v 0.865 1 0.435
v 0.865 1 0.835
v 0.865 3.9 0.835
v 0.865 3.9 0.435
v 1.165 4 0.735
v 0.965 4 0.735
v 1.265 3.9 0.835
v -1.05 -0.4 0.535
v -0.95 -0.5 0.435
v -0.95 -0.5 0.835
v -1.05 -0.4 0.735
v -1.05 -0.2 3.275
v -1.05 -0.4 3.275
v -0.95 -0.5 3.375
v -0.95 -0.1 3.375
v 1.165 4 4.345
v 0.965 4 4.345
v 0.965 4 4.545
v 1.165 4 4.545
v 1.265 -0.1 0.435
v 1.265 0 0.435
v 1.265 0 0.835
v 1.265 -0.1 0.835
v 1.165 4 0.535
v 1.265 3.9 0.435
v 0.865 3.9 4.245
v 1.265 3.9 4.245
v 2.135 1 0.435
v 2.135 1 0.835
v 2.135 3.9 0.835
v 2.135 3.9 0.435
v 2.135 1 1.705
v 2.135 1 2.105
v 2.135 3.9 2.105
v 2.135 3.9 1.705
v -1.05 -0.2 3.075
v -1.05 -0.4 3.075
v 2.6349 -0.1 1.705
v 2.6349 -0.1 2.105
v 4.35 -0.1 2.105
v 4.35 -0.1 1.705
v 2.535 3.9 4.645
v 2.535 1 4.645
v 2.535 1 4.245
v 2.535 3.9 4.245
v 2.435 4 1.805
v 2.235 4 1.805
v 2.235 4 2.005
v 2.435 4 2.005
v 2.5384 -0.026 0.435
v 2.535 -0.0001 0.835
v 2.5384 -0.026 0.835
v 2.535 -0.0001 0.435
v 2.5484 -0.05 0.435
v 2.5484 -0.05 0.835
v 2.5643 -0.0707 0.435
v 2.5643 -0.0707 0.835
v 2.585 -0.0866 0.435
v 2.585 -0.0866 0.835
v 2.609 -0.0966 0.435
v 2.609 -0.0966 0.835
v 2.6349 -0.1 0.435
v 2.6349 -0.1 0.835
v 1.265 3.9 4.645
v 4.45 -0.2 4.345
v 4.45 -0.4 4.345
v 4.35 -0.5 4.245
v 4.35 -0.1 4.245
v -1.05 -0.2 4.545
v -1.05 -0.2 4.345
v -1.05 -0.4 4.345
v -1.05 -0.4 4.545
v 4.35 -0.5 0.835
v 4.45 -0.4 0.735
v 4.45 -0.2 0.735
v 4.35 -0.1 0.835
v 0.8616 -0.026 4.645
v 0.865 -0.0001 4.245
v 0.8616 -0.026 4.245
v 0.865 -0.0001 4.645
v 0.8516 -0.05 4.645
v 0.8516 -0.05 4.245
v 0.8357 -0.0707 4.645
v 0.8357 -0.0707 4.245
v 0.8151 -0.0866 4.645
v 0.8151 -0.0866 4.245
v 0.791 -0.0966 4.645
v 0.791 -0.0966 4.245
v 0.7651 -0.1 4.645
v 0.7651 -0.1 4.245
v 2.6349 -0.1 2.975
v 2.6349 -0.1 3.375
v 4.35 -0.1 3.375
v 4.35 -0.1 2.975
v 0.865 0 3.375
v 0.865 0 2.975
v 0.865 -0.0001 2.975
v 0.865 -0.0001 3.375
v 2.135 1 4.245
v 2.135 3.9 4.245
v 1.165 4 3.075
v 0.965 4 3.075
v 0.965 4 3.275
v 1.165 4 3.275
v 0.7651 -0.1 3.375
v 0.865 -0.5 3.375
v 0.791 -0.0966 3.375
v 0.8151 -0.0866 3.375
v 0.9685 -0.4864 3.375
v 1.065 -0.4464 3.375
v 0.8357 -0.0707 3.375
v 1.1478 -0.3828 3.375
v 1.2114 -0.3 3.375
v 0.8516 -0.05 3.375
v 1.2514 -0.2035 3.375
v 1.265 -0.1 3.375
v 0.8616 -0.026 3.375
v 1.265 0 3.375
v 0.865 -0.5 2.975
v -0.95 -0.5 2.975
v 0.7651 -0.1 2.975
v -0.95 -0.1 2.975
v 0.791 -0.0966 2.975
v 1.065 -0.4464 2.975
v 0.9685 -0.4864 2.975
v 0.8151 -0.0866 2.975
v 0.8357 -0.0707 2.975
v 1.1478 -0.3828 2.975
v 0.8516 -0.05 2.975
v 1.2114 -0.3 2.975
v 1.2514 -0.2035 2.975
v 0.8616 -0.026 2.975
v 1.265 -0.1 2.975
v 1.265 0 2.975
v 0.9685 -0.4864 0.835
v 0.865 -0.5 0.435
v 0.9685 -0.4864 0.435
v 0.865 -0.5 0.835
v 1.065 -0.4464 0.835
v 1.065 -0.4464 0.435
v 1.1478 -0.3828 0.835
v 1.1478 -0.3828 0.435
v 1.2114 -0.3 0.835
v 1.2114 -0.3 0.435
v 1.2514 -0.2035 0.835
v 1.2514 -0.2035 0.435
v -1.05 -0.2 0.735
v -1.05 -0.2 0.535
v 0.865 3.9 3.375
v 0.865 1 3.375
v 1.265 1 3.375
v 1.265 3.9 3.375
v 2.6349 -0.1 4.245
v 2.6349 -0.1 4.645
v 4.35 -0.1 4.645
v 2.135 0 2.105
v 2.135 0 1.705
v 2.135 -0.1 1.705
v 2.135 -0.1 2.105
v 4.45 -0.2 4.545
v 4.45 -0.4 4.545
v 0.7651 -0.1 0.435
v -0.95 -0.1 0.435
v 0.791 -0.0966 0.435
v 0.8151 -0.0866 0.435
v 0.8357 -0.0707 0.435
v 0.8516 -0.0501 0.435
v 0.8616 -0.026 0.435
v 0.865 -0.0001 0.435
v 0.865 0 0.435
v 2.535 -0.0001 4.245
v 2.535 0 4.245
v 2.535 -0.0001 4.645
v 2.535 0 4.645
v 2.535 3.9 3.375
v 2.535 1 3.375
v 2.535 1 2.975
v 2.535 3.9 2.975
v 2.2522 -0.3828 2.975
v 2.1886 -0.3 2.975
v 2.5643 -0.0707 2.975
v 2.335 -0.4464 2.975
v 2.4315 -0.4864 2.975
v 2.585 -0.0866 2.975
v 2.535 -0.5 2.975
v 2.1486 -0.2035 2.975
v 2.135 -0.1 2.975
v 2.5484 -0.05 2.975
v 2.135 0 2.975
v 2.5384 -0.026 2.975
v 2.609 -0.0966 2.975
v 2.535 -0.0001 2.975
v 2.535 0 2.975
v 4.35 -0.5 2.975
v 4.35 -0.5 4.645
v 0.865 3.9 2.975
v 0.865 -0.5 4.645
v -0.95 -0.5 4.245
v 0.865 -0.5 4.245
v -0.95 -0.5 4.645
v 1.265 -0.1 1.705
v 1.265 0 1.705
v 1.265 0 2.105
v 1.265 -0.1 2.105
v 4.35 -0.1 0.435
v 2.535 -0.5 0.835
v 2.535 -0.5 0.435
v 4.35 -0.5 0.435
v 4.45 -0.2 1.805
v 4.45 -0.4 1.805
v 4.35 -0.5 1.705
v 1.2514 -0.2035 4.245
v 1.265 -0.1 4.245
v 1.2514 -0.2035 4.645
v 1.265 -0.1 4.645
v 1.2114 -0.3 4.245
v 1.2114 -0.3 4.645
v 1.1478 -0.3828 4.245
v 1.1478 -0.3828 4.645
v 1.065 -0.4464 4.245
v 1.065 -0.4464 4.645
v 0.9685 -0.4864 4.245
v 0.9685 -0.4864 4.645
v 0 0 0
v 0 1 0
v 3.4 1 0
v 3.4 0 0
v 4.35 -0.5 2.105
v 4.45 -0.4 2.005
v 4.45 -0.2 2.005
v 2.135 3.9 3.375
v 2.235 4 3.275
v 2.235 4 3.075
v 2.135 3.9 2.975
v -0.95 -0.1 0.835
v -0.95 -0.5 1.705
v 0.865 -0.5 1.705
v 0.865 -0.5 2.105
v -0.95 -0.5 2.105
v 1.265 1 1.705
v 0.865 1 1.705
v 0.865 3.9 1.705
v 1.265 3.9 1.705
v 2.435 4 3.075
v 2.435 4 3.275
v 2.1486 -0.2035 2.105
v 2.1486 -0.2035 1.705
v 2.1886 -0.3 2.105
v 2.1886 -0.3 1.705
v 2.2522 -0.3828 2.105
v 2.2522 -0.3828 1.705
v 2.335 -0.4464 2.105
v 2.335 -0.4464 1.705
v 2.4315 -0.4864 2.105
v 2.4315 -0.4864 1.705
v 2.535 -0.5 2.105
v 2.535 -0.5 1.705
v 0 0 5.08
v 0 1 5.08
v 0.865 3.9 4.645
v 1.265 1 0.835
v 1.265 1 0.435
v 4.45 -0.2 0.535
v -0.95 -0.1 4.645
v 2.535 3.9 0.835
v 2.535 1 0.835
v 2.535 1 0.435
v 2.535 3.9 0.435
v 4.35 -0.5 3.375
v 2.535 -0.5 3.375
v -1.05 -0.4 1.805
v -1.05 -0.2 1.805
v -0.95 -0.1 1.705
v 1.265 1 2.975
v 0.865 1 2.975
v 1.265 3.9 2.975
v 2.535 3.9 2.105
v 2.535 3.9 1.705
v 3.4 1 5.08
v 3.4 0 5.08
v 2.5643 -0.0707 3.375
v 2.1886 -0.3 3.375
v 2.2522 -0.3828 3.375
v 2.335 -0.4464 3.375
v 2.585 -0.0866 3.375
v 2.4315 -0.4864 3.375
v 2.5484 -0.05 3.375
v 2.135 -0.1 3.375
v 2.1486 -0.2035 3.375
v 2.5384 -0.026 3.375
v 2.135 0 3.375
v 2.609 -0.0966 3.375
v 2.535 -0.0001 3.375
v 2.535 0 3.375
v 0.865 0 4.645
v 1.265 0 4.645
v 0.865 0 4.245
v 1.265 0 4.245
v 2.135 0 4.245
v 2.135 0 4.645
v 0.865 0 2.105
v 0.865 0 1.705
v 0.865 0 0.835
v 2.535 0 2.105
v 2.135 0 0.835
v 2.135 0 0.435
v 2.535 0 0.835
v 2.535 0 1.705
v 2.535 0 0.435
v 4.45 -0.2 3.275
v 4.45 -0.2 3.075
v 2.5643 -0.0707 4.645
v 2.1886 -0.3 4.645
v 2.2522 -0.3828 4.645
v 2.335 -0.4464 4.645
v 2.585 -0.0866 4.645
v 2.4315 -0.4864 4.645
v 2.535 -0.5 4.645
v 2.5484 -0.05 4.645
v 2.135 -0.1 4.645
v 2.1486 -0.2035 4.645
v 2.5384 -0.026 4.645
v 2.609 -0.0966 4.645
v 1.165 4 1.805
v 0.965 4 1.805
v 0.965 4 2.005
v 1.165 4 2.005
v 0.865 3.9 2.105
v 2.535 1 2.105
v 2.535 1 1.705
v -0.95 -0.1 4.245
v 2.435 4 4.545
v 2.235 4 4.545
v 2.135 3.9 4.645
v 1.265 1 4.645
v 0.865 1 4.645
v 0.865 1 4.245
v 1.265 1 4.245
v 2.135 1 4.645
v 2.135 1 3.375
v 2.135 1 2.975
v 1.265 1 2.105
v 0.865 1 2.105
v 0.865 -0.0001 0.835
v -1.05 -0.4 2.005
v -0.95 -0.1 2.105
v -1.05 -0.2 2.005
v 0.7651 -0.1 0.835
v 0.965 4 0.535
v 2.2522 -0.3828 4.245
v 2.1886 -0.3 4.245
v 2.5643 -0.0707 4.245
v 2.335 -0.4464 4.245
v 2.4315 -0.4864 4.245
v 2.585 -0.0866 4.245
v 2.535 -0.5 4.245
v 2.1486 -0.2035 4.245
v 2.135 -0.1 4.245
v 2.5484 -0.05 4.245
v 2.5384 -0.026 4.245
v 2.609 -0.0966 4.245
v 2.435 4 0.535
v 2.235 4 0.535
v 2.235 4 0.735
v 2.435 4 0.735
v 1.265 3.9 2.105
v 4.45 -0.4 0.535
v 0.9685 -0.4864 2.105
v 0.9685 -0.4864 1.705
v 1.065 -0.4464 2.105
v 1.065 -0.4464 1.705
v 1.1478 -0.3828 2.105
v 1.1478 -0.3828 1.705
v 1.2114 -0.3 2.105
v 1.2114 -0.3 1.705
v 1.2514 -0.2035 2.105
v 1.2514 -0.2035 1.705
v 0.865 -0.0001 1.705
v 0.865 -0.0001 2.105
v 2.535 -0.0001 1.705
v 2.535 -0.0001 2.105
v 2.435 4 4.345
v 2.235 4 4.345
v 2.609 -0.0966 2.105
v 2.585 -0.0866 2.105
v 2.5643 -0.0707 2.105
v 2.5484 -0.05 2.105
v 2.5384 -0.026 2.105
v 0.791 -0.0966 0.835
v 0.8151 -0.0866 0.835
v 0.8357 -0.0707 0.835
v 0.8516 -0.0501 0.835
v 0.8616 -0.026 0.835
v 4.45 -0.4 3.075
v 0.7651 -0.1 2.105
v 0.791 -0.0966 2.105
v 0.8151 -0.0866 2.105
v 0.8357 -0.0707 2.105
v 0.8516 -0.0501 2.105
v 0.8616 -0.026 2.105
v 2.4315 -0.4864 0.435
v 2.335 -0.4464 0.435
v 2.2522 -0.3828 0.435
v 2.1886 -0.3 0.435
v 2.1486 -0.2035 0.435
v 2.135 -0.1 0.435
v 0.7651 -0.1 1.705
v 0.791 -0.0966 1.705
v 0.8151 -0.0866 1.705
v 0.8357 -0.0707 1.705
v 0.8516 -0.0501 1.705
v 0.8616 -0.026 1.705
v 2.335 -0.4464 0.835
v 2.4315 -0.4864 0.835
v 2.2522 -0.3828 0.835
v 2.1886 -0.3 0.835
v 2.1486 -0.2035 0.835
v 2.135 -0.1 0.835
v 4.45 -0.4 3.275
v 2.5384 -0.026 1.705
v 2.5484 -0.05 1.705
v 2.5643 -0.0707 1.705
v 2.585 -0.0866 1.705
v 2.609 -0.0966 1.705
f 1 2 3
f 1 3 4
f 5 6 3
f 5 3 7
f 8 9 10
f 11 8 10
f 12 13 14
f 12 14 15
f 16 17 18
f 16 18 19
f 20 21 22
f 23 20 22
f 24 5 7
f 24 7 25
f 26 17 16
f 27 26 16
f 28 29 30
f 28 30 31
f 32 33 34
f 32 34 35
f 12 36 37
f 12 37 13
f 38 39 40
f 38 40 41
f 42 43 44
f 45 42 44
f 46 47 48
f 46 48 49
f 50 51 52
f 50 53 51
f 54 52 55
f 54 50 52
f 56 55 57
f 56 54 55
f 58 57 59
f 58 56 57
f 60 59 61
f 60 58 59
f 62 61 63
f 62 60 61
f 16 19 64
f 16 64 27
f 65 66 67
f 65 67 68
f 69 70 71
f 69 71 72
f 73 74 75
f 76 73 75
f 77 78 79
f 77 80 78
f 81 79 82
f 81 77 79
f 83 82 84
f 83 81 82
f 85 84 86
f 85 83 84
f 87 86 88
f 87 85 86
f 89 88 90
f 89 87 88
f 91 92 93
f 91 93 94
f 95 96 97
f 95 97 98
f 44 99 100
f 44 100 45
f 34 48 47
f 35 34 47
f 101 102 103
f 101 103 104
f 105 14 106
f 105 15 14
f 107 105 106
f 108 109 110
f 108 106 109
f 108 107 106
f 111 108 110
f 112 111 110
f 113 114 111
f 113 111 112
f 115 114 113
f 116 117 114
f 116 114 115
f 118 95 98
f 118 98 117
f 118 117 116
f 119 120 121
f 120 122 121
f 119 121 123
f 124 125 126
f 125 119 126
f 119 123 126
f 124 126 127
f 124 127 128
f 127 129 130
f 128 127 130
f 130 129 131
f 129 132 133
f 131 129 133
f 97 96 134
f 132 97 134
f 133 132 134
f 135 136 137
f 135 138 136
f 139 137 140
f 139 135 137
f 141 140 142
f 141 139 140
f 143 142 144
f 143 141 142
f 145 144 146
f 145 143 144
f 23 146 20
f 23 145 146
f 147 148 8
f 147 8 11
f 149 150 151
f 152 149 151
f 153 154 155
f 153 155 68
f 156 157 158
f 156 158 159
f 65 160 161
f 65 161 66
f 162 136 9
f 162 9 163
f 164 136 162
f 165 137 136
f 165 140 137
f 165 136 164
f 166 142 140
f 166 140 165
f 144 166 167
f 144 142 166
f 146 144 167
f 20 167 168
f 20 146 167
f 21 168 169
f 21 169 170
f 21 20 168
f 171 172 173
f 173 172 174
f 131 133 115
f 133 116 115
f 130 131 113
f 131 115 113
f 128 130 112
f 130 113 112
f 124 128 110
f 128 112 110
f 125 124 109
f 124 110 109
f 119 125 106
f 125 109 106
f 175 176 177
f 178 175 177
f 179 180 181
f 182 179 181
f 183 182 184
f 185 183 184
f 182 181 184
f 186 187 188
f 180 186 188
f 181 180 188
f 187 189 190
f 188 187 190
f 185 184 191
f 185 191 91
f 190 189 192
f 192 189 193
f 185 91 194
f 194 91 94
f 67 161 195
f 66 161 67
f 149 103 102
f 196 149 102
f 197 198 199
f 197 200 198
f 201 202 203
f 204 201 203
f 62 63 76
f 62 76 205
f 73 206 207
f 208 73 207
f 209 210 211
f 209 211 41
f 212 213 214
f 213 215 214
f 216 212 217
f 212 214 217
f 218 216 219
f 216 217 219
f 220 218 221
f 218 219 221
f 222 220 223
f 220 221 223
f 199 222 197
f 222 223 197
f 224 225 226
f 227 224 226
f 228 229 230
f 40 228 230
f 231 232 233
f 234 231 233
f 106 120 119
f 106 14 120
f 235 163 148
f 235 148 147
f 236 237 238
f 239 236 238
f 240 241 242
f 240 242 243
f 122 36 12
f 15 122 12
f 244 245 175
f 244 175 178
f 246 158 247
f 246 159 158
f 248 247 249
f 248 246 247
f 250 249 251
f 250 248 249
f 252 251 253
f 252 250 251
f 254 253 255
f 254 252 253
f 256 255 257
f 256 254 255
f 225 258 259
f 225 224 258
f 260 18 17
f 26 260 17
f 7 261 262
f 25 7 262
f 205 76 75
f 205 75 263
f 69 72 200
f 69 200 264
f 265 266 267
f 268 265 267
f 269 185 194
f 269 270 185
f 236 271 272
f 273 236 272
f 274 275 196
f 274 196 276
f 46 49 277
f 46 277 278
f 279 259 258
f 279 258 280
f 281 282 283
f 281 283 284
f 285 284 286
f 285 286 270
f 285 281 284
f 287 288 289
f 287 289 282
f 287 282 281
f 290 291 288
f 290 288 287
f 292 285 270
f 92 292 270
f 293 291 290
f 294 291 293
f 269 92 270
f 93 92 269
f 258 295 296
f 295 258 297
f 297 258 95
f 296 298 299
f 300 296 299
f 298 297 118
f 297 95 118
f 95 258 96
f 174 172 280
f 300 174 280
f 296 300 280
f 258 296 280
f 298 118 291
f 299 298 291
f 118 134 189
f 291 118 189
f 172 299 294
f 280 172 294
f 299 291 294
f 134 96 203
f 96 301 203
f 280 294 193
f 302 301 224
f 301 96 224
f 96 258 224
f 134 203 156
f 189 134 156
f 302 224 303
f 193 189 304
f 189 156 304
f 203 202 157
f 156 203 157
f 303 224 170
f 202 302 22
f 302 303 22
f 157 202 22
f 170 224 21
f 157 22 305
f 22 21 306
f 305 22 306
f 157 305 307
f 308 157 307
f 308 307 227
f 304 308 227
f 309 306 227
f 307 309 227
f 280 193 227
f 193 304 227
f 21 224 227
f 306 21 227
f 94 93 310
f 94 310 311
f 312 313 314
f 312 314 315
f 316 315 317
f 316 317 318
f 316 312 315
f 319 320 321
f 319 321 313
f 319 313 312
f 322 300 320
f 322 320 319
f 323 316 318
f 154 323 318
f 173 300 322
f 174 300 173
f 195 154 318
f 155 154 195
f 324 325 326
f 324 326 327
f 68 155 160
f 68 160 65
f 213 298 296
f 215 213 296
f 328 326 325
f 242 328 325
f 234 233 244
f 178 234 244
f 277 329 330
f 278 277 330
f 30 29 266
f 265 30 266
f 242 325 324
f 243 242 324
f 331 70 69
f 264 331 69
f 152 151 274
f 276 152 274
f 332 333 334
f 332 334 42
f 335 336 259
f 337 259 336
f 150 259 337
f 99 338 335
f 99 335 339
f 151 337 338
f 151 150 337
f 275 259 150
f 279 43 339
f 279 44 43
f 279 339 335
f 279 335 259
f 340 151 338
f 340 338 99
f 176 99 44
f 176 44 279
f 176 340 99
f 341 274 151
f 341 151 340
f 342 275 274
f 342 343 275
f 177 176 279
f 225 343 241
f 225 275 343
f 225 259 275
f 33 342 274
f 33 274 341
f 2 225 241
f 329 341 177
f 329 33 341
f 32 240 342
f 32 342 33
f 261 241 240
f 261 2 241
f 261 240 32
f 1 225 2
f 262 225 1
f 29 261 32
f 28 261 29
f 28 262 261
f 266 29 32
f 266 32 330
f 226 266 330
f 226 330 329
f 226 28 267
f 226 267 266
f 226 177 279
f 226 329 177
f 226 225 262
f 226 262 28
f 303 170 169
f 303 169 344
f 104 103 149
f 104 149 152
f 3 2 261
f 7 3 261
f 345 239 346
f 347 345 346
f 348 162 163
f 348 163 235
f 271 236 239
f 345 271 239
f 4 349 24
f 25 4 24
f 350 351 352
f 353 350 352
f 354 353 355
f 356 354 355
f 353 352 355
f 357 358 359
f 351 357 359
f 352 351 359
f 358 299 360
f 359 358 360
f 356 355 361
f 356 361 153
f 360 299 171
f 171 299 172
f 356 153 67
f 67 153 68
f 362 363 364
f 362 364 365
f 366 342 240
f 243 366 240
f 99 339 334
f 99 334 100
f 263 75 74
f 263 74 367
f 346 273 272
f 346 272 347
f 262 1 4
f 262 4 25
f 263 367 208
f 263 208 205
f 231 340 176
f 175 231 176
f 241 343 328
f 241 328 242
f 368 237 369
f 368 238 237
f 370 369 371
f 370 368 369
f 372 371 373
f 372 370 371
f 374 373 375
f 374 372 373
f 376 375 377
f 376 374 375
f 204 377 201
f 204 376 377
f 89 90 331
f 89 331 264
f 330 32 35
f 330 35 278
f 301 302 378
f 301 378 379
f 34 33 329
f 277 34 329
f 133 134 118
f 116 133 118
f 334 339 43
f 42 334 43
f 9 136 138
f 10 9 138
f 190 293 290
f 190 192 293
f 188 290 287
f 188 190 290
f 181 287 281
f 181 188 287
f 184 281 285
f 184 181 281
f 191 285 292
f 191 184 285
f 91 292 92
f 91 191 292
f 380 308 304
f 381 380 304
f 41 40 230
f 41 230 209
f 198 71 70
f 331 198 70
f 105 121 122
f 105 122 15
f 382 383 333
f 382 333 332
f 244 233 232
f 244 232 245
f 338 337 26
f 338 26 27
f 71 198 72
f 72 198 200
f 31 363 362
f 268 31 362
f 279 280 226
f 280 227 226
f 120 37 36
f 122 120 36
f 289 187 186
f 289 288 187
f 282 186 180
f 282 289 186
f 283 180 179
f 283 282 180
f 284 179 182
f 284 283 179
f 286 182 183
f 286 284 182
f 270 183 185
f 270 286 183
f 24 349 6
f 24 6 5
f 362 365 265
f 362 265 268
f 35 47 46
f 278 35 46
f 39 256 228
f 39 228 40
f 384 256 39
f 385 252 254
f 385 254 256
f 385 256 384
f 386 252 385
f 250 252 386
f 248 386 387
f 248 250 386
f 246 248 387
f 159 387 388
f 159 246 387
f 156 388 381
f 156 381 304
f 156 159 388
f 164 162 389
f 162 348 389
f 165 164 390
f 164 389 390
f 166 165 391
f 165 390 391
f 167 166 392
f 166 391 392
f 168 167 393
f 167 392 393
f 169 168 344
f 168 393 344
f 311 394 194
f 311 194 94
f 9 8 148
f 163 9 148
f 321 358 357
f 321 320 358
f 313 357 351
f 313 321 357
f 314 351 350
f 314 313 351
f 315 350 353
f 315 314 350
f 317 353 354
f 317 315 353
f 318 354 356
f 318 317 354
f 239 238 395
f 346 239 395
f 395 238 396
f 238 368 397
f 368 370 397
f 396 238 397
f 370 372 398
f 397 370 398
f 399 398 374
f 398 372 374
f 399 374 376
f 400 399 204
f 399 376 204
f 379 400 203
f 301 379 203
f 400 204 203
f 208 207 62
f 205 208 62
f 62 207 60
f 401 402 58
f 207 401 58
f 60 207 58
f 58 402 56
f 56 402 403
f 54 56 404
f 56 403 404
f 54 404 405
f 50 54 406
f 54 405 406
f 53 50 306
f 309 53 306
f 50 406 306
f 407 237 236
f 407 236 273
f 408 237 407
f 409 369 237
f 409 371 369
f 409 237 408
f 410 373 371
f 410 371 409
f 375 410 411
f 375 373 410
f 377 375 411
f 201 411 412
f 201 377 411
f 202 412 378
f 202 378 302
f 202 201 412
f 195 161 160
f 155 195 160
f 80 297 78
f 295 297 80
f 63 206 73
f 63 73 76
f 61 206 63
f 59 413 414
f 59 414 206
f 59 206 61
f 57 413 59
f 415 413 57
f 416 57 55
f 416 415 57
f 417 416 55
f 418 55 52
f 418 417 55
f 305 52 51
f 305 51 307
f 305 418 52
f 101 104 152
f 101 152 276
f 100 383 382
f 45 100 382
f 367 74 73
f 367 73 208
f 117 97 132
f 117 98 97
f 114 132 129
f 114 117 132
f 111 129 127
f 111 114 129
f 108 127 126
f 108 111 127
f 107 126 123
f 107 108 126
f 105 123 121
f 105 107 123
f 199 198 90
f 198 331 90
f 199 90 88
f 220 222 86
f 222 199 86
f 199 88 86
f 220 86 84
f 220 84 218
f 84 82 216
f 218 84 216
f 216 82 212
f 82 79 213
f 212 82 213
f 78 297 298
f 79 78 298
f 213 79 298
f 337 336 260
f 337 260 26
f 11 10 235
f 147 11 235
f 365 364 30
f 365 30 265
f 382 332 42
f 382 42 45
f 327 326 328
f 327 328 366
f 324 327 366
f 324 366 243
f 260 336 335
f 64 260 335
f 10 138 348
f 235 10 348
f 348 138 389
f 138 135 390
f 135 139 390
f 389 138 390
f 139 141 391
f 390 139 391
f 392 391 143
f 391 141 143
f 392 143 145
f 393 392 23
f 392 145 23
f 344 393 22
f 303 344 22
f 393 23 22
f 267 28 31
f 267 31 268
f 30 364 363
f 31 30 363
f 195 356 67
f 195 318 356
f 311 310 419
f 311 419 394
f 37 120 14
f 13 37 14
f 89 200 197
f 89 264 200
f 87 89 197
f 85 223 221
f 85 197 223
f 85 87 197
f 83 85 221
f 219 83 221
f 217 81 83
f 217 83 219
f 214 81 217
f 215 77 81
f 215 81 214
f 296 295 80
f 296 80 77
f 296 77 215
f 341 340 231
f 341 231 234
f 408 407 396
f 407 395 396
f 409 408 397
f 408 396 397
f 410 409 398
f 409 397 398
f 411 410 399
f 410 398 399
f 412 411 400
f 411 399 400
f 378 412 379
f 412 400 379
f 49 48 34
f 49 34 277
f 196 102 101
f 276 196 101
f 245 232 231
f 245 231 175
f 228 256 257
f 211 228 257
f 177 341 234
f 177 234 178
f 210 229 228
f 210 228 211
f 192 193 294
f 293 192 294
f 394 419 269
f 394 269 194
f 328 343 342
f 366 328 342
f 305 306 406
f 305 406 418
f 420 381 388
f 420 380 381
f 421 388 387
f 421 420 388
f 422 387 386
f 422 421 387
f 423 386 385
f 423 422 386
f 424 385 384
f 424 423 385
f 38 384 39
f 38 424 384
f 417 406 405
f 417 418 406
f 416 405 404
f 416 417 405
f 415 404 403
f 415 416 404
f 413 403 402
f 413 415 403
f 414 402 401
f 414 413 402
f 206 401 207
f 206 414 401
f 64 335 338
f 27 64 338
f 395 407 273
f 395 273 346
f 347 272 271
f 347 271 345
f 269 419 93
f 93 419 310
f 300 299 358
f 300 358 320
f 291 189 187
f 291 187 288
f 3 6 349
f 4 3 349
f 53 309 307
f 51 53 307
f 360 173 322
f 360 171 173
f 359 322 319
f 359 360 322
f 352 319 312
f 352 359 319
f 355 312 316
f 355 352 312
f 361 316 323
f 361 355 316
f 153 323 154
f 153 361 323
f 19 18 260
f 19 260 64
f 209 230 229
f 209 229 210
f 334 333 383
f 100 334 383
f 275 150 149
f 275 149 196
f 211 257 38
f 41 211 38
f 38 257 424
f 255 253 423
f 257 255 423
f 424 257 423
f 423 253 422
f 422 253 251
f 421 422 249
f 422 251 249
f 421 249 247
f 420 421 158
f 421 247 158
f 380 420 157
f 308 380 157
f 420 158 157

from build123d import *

# Parameters (mm, degrees)
SKIZZE1_W                         = 3.4
SKIZZE1_H                         = 1
AUFSATZ_LINEAR_AUSTRAGEN1_DEPTH   = 1.27
SKIZZE3_W                         = 0.4
SKIZZE3_H                         = 0.4
AUFSATZ_LINEAR_AUSTRAGEN3_DEPTH   = 0.5
SKIZZE4_W                         = 0.4
SKIZZE4_H                         = 0.4
AUFSATZ_LINEAR_AUSTRAGEN4_DEPTH   = 1.915
SKIZZE5_W                         = 0.4
SKIZZE5_H                         = 0.4
AUFSATZ_LINEAR_AUSTRAGEN5_DEPTH   = 1.915
SKIZZE6_W                         = 0.4
SKIZZE6_H                         = 0.4
AUFSATZ_LINEAR_AUSTRAGEN6_DEPTH   = 3
FASE2_SIZE                        = 0.1
VERRUNDUNG1_R                     = 0.1
VERRUNDUNG2_R                     = 0.4
LINEARES_MUSTER1_COUNT            = 4
LINEARES_MUSTER1_PITCH            = 1.27
FASE2_OF_LINEARES_MUSTER1_SIZE    = 0.1
VERRUNDUNG1_OF_LINEARES_MUSTER1_R = 0.1
VERRUNDUNG2_OF_LINEARES_MUSTER1_R = 0.4


with BuildPart() as part:
    # Skizze1 → Aufsatz-Linear austragen1 (new body)
    with BuildSketch(Plane.XY):
        with Locations((1.7, 0.5)):
            Rectangle(SKIZZE1_W, SKIZZE1_H)
    aufsatz_linear_austragen1 = extrude(amount=AUFSATZ_LINEAR_AUSTRAGEN1_DEPTH)

    # Skizze3 → Aufsatz-Linear austragen3 (add)
    with BuildSketch(Plane.XZ):
        with Locations((1.065, 0.635)):
            Rectangle(SKIZZE3_W, SKIZZE3_H)
        with Locations((2.335, 0.635)):
            Rectangle(SKIZZE3_W, SKIZZE3_H)
    aufsatz_linear_austragen3 = extrude(amount=AUFSATZ_LINEAR_AUSTRAGEN3_DEPTH)

    # Skizze4 → Aufsatz-Linear austragen4 (add)
    with BuildSketch(Plane(origin=(2.535, 0, 0), x_dir=(0, 0, -1), z_dir=(1, 0, 0))):
        with Locations((-0.635, -0.3)):
            Rectangle(SKIZZE4_W, SKIZZE4_H)
    aufsatz_linear_austragen4 = extrude(amount=AUFSATZ_LINEAR_AUSTRAGEN4_DEPTH)

    # Skizze5 → Aufsatz-Linear austragen5 (add)
    with BuildSketch(Plane.ZY.offset(-0.865)):
        with Locations((0.635, -0.3)):
            Rectangle(SKIZZE5_W, SKIZZE5_H)
    aufsatz_linear_austragen5 = extrude(amount=AUFSATZ_LINEAR_AUSTRAGEN5_DEPTH)

    # Skizze6 → Aufsatz-Linear austragen6 (add)
    with BuildSketch(Plane(origin=(0, 1, 0), x_dir=(1, 0, 0), z_dir=(0, 1, 0))):
        with Locations((1.065, -0.635)):
            Rectangle(SKIZZE6_W, SKIZZE6_H)
        with Locations((2.335, -0.635)):
            Rectangle(SKIZZE6_W, SKIZZE6_H)
    aufsatz_linear_austragen6 = extrude(amount=AUFSATZ_LINEAR_AUSTRAGEN6_DEPTH)

    # Fase2
    fase2_edges = [part.edges().sort_by_distance(p)[0] for p in [
        (4.45, -0.3, 0.835),
        (4.45, -0.5, 0.635),
        (4.45, -0.3, 0.435),
        (4.45, -0.1, 0.635),
        (-1.05, -0.3, 0.835),
        (-1.05, -0.1, 0.635),
        (-1.05, -0.3, 0.435),
        (-1.05, -0.5, 0.635),
        (1.265, 4, 0.635),
        (1.065, 4, 0.435),
        (0.865, 4, 0.635),
        (1.065, 4, 0.835),
        (2.535, 4, 0.635),
        (2.335, 4, 0.435),
        (2.135, 4, 0.635),
        (2.335, 4, 0.835),
    ]]
    chamfer(fase2_edges, length=FASE2_SIZE)

    # Verrundung1
    verrundung1_edges = [part.edges().sort_by_distance(p)[0] for p in [
        (0.865, -0.1, 0.635),
        (2.535, -0.1, 0.635),
    ]]
    fillet(verrundung1_edges, radius=VERRUNDUNG1_R - 0.0001)  # a hair under: the kernel refuses the full size

    # Verrundung2
    verrundung2_edges = [part.edges().sort_by_distance(p)[0] for p in [
        (1.265, -0.5, 0.635),
        (2.135, -0.5, 0.635),
    ]]
    fillet(verrundung2_edges, radius=VERRUNDUNG2_R)

    # Lineares Muster1: Aufsatz-Linear austragen1, Aufsatz-Linear austragen3, Aufsatz-Linear austragen4, Aufsatz-Linear austragen5, Aufsatz-Linear austragen6 ×4
    with Locations(*[(0, 0, i * LINEARES_MUSTER1_PITCH) for i in range(1, LINEARES_MUSTER1_COUNT)]):
        add(aufsatz_linear_austragen1)
        add(aufsatz_linear_austragen3)
        add(aufsatz_linear_austragen4)
        add(aufsatz_linear_austragen5)
        add(aufsatz_linear_austragen6)

    # Fase2 of Lineares Muster1
    fase2_of_lineares_muster1_edges = [part.edges().sort_by_distance(p)[0] for p in [
        (4.45, -0.3, 2.105),
        (4.45, -0.5, 1.905),
        (4.45, -0.3, 1.705),
        (4.45, -0.1, 1.905),
        (-1.05, -0.3, 2.105),
        (-1.05, -0.1, 1.905),
        (-1.05, -0.3, 1.705),
        (-1.05, -0.5, 1.905),
        (1.265, 4, 1.905),
        (1.065, 4, 1.705),
        (0.865, 4, 1.905),
        (1.065, 4, 2.105),
        (2.535, 4, 1.905),
        (2.335, 4, 1.705),
        (2.135, 4, 1.905),
        (2.335, 4, 2.105),
        (4.45, -0.3, 3.375),
        (4.45, -0.5, 3.175),
        (4.45, -0.3, 2.975),
        (4.45, -0.1, 3.175),
        (-1.05, -0.3, 3.375),
        (-1.05, -0.1, 3.175),
        (-1.05, -0.3, 2.975),
        (-1.05, -0.5, 3.175),
        (1.265, 4, 3.175),
        (1.065, 4, 2.975),
        (0.865, 4, 3.175),
        (1.065, 4, 3.375),
        (2.535, 4, 3.175),
        (2.335, 4, 2.975),
        (2.135, 4, 3.175),
        (2.335, 4, 3.375),
        (4.45, -0.3, 4.645),
        (4.45, -0.5, 4.445),
        (4.45, -0.3, 4.245),
        (4.45, -0.1, 4.445),
        (-1.05, -0.3, 4.645),
        (-1.05, -0.1, 4.445),
        (-1.05, -0.3, 4.245),
        (-1.05, -0.5, 4.445),
        (1.265, 4, 4.445),
        (1.065, 4, 4.245),
        (0.865, 4, 4.445),
        (1.065, 4, 4.645),
        (2.535, 4, 4.445),
        (2.335, 4, 4.245),
        (2.135, 4, 4.445),
        (2.335, 4, 4.645),
    ]]
    chamfer(fase2_of_lineares_muster1_edges, length=FASE2_OF_LINEARES_MUSTER1_SIZE)

    # Verrundung1 of Lineares Muster1
    verrundung1_of_lineares_muster1_edges = [part.edges().sort_by_distance(p)[0] for p in [
        (0.865, -0.1, 1.905),
        (2.535, -0.1, 1.905),
        (0.865, -0.1, 3.175),
        (2.535, -0.1, 3.175),
        (0.865, -0.1, 4.445),
        (2.535, -0.1, 4.445),
    ]]
    fillet(verrundung1_of_lineares_muster1_edges, radius=VERRUNDUNG1_OF_LINEARES_MUSTER1_R - 0.0001)  # a hair under: the kernel refuses the full size

    # Verrundung2 of Lineares Muster1
    verrundung2_of_lineares_muster1_edges = [part.edges().sort_by_distance(p)[0] for p in [
        (1.265, -0.5, 1.905),
        (2.135, -0.5, 1.905),
        (1.265, -0.5, 3.175),
        (2.135, -0.5, 3.175),
        (1.265, -0.5, 4.445),
        (2.135, -0.5, 4.445),
    ]]
    fillet(verrundung2_of_lineares_muster1_edges, radius=VERRUNDUNG2_OF_LINEARES_MUSTER1_R)


solid = part.part
